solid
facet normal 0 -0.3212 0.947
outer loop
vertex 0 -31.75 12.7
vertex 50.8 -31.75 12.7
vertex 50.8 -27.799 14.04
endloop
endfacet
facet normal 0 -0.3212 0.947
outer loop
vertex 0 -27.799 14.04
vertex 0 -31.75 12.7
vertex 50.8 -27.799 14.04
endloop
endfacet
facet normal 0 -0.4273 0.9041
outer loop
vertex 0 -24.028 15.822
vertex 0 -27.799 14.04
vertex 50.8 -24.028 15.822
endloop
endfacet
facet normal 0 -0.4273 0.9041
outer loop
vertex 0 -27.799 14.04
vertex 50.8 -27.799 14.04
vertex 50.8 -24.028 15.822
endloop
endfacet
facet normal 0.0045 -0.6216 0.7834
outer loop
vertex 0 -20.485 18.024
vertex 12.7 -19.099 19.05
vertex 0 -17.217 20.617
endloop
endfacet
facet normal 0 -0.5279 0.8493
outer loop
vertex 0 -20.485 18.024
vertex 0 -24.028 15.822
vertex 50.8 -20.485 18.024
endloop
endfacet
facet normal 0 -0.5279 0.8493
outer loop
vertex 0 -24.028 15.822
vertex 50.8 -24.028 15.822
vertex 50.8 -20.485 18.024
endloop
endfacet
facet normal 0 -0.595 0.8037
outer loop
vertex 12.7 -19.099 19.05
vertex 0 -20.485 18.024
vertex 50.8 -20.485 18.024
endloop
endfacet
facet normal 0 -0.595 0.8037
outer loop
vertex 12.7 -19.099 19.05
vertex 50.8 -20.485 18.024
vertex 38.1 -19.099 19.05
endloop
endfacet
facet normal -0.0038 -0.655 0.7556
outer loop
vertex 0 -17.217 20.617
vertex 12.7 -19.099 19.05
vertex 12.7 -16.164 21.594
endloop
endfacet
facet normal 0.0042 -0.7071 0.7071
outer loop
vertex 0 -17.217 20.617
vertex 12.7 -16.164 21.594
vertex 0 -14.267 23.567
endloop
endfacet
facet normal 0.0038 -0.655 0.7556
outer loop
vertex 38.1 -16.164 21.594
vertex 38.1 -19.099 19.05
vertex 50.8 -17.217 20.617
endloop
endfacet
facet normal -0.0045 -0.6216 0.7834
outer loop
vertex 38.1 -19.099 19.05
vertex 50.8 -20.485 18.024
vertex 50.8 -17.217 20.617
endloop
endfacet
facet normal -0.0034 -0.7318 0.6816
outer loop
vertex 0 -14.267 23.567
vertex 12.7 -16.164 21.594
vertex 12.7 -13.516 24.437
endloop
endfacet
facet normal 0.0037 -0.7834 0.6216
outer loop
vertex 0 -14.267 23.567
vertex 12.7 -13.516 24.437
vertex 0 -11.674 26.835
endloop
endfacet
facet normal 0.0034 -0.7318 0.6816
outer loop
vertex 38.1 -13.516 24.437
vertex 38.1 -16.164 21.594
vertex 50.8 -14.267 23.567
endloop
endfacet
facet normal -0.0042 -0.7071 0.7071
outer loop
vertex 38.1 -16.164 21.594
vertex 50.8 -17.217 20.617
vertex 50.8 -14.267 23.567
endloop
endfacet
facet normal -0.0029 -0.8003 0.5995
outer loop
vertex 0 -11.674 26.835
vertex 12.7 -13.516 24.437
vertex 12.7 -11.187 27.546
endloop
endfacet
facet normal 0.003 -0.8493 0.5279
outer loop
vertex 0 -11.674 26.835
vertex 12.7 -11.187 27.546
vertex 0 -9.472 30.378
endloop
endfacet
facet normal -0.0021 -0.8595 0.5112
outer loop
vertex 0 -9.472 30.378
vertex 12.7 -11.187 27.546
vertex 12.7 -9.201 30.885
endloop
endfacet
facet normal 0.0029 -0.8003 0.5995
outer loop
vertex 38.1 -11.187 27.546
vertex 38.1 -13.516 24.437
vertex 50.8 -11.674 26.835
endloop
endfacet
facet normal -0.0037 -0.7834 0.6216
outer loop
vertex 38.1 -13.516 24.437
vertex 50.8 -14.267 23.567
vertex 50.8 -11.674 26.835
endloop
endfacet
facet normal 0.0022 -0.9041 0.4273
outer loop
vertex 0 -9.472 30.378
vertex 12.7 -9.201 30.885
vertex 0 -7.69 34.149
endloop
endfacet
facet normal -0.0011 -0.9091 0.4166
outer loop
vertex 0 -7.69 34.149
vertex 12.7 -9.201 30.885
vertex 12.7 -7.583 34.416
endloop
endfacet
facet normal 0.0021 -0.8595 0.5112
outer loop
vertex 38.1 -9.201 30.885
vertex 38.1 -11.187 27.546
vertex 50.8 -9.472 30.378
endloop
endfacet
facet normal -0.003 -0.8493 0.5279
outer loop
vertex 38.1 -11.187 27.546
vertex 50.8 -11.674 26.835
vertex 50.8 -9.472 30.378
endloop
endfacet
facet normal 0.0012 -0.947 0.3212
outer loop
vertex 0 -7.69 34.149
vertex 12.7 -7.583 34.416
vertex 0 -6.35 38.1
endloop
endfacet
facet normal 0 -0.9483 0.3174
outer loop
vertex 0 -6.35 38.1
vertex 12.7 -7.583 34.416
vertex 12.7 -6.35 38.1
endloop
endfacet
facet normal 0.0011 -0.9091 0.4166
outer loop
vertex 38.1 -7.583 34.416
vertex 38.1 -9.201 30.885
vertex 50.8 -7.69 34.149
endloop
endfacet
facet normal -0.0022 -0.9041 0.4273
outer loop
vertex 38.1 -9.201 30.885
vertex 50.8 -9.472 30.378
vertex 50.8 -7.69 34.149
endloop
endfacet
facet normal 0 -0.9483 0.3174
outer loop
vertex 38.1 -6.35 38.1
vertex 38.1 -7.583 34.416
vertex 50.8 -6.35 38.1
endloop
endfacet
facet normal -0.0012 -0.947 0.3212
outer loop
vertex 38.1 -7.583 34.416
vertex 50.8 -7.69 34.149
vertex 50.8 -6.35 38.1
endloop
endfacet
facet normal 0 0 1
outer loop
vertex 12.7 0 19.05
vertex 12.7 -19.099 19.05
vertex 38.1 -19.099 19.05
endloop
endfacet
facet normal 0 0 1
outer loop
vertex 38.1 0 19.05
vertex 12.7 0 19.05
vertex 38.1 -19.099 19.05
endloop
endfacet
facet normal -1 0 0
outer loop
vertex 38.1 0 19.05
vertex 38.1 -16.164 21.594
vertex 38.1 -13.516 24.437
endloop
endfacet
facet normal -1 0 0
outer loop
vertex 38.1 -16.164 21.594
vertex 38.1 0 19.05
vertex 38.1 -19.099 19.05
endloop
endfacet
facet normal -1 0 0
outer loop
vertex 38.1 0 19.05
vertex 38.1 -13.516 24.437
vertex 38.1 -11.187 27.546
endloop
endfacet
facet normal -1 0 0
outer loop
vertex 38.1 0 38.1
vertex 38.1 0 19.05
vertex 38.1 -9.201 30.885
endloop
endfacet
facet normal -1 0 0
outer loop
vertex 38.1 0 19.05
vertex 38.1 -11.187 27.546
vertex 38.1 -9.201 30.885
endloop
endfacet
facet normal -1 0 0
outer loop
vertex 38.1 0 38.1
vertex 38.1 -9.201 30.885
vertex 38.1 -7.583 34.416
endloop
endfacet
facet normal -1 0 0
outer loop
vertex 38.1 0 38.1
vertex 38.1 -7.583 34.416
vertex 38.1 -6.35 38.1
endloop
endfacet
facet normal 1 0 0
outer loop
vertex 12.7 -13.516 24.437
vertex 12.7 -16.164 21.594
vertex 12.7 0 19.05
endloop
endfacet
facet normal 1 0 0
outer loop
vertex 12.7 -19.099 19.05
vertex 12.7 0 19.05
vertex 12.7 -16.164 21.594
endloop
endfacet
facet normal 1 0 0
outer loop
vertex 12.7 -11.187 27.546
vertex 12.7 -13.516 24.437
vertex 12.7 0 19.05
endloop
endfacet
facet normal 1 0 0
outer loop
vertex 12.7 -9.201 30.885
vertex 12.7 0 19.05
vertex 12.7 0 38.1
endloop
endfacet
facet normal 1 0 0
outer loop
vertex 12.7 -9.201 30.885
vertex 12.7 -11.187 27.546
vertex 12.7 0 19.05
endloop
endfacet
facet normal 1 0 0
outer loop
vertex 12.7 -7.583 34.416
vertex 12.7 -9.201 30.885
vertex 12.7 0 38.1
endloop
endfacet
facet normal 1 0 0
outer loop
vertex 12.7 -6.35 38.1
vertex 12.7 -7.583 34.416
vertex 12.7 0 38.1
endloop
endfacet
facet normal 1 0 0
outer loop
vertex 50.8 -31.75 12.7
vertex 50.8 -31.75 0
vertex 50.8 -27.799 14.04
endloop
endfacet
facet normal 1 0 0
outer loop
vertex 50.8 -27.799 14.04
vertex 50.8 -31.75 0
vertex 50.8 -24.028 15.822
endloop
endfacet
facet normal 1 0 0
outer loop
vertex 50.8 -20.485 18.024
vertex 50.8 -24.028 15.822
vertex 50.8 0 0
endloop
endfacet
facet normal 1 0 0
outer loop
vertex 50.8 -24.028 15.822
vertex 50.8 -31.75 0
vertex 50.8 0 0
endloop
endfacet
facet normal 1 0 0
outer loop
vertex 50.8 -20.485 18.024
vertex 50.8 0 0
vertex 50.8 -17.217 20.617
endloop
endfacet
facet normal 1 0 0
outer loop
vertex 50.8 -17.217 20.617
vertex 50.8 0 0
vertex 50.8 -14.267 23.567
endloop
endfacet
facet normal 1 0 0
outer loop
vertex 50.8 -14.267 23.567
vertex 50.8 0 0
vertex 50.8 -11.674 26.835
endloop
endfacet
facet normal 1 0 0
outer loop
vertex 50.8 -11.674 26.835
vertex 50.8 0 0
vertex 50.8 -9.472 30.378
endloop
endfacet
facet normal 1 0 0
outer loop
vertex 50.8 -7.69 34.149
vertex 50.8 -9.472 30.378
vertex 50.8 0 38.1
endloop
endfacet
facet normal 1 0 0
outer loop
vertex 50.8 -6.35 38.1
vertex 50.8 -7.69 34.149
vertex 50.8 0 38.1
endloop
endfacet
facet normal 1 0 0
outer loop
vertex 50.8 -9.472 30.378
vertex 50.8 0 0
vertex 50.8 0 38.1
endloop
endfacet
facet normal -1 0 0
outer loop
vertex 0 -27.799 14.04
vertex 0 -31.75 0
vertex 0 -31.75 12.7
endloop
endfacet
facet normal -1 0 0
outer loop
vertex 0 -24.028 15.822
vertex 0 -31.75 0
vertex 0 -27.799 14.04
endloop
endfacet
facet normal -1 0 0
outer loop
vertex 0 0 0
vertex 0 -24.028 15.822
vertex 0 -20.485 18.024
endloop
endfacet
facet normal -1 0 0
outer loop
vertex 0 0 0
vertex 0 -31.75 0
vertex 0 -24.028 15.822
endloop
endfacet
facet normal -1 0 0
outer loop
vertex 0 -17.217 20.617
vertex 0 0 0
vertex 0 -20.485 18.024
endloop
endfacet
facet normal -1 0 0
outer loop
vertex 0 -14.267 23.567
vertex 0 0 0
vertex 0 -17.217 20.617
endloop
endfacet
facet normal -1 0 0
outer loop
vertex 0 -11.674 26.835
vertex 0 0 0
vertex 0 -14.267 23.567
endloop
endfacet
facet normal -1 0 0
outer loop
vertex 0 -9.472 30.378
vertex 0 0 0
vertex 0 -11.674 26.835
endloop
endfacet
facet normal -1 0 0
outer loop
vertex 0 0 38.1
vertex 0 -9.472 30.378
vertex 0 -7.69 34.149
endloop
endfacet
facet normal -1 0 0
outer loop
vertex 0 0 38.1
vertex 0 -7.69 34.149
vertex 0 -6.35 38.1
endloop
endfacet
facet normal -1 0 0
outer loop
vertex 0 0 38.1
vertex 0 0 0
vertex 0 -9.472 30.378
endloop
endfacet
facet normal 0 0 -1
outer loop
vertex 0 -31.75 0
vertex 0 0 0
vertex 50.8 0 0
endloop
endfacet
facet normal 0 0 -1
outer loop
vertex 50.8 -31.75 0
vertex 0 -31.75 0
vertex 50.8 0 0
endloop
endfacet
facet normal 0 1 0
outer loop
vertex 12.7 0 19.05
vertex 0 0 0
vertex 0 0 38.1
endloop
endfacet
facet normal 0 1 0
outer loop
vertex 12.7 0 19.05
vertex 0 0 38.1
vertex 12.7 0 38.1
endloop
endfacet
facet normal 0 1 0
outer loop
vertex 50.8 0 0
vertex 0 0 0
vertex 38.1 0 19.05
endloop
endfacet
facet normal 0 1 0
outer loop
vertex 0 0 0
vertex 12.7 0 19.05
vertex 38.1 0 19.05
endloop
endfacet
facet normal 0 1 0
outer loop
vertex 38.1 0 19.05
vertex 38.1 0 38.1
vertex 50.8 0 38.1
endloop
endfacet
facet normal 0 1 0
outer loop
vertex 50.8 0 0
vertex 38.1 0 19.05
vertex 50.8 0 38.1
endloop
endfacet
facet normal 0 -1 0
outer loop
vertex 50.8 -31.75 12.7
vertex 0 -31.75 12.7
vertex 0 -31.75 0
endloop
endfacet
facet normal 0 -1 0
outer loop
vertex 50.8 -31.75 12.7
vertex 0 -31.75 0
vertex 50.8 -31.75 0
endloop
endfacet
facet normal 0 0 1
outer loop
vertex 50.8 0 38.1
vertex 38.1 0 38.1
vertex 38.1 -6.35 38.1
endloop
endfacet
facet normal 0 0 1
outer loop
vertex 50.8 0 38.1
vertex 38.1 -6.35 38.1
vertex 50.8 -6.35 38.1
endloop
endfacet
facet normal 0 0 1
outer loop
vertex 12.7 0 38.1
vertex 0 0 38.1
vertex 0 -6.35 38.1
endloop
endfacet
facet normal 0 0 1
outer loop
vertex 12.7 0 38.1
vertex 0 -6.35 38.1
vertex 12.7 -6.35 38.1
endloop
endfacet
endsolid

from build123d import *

# Parameters (mm, degrees)
F0_W     = 50.8
F0_H     = 38.1
F1_DEPTH = 31.75
F2_W     = 25.4
F2_H     = 19.05
F3_DEPTH = 38.1
F5_DEPTH = 76.2


with BuildPart() as f1:
    # F0 (on Front) → F1 (new body)
    with BuildSketch(Plane.XZ):
        with Locations((25.4, 19.05)):
            Rectangle(F0_W, F0_H)
    extrude(amount=F1_DEPTH)

    # F2 (on face) → F3 (cut)
    with BuildSketch(Plane.XZ.offset(31.75)):
        with Locations((25.4, 28.575)):
            Rectangle(F2_W, F2_H)
    extrude(amount=-F3_DEPTH, mode=Mode.SUBTRACT)

    # F4 (on face) → F5 (cut)
    with BuildSketch(Plane.YZ.offset(50.8)):
        with BuildLine():
            Line((-6.35, 38.1), (-31.75, 38.1))
            Line((-31.75, 38.1), (-31.75, 12.7))
            ThreePointArc((-31.75, 12.7), (-15.700044, 22.050044), (-6.35, 38.1))
        make_face()
    extrude(amount=-F5_DEPTH, mode=Mode.SUBTRACT)


solid = f1.part
